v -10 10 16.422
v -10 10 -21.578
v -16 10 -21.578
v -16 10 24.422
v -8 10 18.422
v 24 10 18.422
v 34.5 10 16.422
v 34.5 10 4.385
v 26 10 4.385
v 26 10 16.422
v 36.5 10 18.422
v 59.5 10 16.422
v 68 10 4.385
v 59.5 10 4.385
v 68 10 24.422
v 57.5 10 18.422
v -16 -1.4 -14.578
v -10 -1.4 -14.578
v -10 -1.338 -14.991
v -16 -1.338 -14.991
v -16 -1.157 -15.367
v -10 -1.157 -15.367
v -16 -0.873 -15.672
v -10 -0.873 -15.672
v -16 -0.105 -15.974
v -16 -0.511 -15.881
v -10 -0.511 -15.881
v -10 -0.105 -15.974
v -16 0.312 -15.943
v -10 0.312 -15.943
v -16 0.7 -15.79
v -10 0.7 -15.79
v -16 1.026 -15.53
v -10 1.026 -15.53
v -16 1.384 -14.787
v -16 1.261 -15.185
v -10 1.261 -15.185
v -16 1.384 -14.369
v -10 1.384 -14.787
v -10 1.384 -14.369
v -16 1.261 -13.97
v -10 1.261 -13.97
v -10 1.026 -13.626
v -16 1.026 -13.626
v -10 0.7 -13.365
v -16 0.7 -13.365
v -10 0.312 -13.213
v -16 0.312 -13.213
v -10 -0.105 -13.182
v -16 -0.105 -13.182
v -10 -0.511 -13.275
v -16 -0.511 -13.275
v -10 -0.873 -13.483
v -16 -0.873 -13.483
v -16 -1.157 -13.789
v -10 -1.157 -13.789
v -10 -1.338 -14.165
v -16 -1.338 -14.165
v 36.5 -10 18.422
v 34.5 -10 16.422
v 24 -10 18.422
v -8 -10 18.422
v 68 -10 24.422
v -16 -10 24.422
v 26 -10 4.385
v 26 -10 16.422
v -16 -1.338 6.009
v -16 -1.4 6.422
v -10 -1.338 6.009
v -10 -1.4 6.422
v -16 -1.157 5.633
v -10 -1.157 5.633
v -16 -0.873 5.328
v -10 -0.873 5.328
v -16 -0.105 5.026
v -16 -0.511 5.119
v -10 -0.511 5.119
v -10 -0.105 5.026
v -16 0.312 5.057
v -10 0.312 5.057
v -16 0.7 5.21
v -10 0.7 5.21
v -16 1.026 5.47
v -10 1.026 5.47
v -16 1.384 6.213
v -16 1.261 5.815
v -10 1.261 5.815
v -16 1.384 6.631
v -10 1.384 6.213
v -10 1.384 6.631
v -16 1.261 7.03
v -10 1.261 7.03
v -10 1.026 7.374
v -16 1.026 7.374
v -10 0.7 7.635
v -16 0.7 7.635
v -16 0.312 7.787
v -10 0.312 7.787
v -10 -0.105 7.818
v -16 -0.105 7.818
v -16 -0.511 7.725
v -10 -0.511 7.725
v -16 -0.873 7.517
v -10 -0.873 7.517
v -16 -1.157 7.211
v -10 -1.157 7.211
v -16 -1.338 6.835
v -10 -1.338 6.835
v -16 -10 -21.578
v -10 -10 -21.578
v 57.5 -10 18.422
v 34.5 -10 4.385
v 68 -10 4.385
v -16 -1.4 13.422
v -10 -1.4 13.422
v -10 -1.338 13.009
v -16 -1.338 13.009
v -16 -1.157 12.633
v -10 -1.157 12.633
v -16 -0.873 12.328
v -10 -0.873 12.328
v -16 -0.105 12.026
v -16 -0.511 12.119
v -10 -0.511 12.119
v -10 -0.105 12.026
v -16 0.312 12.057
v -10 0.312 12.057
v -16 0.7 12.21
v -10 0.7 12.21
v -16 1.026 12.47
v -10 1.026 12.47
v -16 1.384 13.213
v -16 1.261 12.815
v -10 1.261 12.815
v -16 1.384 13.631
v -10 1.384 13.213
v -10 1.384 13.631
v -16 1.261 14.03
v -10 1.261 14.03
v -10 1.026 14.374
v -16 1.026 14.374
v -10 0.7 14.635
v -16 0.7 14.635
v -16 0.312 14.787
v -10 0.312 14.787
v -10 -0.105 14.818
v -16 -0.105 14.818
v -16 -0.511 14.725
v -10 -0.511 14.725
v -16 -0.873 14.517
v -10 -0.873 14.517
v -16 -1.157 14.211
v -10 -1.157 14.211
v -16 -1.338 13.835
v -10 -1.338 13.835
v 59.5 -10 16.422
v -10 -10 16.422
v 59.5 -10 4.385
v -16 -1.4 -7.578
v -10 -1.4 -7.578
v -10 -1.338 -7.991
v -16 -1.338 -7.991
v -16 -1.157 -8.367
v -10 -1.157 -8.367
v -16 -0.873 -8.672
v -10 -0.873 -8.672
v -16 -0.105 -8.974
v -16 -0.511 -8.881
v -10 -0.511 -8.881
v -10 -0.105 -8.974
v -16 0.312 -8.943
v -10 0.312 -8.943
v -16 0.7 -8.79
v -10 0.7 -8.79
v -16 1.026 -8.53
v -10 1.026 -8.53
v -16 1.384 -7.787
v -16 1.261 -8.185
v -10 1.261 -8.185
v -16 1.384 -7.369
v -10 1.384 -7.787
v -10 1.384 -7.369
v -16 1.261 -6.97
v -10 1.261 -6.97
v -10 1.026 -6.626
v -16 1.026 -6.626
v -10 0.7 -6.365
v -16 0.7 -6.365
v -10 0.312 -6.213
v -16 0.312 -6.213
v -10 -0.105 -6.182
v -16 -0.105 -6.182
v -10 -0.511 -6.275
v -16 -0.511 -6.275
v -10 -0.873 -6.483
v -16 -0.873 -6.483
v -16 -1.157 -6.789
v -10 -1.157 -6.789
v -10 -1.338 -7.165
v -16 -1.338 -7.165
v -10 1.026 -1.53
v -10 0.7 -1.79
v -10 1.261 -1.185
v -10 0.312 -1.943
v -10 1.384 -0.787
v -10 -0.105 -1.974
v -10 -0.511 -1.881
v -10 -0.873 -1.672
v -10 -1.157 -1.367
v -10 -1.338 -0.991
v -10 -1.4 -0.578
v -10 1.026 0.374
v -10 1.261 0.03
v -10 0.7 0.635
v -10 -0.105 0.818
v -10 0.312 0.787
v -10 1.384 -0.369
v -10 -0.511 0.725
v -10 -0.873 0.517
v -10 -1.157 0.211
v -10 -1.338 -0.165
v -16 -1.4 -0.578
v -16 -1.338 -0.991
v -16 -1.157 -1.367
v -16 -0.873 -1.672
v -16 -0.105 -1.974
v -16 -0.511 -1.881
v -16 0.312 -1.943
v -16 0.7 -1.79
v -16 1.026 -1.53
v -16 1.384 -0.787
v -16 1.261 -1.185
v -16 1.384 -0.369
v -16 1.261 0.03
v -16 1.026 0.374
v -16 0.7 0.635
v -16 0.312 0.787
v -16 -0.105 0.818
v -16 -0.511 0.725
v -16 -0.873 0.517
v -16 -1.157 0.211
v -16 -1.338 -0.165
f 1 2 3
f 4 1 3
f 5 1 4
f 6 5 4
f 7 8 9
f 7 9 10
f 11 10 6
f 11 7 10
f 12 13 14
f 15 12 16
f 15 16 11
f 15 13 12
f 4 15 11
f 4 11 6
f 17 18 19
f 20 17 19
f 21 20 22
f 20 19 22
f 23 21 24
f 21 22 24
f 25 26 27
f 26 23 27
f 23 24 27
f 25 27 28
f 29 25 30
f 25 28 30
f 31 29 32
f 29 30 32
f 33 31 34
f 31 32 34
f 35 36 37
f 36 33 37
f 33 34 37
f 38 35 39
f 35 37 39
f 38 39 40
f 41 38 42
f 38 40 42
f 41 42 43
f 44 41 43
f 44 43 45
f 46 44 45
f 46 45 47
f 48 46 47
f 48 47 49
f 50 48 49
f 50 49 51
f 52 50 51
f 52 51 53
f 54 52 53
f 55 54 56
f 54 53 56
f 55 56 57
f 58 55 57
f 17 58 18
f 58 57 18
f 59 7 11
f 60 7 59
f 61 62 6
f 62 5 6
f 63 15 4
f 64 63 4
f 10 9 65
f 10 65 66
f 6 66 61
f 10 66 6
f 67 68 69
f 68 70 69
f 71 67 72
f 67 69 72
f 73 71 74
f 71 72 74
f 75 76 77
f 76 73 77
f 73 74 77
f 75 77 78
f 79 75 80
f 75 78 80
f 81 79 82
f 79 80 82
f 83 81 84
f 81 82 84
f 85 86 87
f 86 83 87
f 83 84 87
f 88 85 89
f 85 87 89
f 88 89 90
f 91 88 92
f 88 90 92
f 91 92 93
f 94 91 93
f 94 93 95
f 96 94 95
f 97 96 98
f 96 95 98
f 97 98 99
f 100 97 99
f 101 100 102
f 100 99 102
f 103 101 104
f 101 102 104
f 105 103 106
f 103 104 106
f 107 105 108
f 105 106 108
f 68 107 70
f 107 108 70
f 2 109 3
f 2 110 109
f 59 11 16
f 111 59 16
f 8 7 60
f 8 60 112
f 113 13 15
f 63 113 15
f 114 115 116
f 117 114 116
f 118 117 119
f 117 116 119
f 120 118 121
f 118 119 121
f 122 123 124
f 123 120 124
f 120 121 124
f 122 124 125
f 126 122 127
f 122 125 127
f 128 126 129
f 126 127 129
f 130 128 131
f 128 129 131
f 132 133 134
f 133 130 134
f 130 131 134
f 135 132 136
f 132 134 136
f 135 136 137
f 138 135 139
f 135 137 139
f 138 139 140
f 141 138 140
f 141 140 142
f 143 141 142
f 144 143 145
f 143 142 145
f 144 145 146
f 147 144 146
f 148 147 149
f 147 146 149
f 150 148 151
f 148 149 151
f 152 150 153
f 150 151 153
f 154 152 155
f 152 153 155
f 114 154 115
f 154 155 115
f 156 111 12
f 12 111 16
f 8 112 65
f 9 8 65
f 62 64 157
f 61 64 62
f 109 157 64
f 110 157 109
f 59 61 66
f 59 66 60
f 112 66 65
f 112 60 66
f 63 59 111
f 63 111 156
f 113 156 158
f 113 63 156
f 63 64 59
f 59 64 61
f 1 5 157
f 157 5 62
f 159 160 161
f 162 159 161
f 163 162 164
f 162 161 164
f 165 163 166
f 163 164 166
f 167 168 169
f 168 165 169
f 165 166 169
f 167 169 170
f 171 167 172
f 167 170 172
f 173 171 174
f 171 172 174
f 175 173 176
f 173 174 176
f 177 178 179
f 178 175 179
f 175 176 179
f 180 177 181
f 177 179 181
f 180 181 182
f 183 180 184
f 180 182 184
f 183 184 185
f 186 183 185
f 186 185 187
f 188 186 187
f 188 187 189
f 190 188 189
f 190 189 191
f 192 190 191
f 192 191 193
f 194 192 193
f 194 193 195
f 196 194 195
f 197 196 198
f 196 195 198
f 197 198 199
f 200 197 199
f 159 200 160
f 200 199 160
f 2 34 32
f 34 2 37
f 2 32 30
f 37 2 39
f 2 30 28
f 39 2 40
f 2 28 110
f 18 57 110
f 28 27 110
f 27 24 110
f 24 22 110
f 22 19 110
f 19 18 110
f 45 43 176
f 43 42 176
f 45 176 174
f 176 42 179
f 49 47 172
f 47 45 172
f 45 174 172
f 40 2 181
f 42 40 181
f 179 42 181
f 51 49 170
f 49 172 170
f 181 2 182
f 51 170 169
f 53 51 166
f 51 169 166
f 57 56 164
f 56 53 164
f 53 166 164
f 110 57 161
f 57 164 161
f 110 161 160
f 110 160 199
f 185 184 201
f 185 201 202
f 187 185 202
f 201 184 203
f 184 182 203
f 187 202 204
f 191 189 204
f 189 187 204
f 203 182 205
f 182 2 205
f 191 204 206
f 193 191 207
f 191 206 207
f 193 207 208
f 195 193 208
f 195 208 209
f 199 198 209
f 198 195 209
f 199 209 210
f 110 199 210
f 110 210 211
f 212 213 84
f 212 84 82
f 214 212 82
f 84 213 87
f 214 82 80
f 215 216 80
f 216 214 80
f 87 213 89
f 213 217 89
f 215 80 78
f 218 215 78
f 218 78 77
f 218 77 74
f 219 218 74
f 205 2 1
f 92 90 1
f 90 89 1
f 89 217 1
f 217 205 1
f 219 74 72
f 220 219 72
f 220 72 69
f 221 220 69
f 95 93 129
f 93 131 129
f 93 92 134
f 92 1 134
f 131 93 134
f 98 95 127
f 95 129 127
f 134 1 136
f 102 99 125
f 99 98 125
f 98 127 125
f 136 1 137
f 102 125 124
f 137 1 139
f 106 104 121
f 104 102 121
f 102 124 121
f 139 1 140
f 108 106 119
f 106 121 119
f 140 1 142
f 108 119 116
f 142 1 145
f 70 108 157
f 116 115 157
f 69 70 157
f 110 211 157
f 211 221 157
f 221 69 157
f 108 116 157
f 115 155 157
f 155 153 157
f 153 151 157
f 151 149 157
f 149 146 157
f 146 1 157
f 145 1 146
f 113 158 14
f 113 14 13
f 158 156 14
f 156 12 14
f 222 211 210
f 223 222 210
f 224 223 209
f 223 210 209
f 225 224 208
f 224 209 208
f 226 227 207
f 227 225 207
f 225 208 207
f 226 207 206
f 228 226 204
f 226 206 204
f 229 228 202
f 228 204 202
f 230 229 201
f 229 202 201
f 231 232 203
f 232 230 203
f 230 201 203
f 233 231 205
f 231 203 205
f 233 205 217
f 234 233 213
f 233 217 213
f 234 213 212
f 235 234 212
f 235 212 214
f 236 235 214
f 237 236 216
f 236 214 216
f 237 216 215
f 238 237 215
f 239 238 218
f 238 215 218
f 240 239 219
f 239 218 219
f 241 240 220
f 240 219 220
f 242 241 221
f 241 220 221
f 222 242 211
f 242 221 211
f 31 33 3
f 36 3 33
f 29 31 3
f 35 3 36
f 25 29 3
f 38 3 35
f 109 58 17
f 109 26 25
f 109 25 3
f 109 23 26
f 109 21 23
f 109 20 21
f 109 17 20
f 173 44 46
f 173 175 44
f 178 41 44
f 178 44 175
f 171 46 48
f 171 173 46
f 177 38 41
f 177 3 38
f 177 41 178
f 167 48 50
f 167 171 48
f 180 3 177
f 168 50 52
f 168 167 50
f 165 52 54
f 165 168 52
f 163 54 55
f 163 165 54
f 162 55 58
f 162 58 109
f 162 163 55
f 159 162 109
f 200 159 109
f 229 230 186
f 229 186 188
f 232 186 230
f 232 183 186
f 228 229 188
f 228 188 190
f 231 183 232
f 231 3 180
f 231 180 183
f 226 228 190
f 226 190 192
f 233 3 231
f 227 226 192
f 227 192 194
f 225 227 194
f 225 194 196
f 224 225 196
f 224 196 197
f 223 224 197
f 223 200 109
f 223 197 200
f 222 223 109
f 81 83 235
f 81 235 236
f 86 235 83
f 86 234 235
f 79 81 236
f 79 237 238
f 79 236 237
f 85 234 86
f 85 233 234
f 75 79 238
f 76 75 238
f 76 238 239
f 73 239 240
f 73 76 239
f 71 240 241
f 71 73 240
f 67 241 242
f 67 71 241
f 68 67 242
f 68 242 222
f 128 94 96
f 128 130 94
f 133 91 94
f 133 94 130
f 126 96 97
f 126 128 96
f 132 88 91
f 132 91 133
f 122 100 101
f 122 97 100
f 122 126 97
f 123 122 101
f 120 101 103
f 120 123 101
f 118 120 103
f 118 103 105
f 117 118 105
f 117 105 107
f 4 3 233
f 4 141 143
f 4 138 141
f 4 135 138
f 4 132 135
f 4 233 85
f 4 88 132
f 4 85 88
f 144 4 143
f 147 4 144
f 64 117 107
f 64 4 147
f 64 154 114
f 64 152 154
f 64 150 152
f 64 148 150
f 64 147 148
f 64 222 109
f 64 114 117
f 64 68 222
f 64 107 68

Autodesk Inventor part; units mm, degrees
ref_plane "YZ Plane" through (0, 0, 0) normal (1, 0, 0) x (0, 1, 0)
ref_plane "XZ Plane" through (0, 0, 0) normal (0, 1, 0) x (-1, 0, 0)
ref_plane "XY Plane" through (0, 0, 0) normal (0, 0, 1) x (1, 0, 0)
ref_plane "Work Plane1" through (-10, 22.6373, -244.9923) normal (-1, 0, 0) x (0, -1, 0)
sketch "Sketch1" plane through (-10, 22.6373, -244.9923) normal (-1, 0, 0) x (0, -1, 0)
  line L0 (26.6373, -5.0077) -> (32.6373, -5.0077) construction
  line L1 (32.6373, -5.0077) -> (32.6373, 244.9923) construction
  line L2 (26.6373, 244.9923) -> (32.6373, 244.9923) construction
  line L3 (26.6373, -5.0077) -> (26.6373, 244.9923) construction
  line L4 (12.6373, -5.0077) -> (18.6373, -5.0077) construction
  line L5 (18.6373, -5.0077) -> (18.6373, 244.9923) construction
  line L6 (12.6373, 244.9923) -> (18.6373, 244.9923) construction
  line L7 (12.6373, -5.0077) -> (12.6373, 244.9923) construction
  line L8 (12.6373, 223.4144) -> (32.6373, 223.4144) construction
  line L9 (32.6373, 223.4144) -> (32.6373, 263.4144) construction
  line L10 (32.6373, 263.4144) -> (12.6373, 263.4144) construction
  line L11 (12.6373, 263.4144) -> (12.6373, 223.4144) construction
  line L12 (12.6373, 263.4144) -> (32.6373, 263.4144) construction
  line L13 (32.6373, 263.4144) -> (32.6373, 223.4144) construction
  line L14 (32.6373, 223.4144) -> (12.6373, 223.4144) construction
  line L15 (12.6373, 223.4144) -> (12.6373, 263.4144) construction
  line L16 (12.6373, 263.4144) -> (32.6373, 263.4144)
  line L17 (32.6373, 263.4144) -> (32.6373, 223.4144)
  line L18 (32.6373, 223.4144) -> (12.6373, 223.4144)
  line L19 (12.6373, 223.4144) -> (12.6373, 263.4144)
  circle A0 centre (22.6373, 258.4144) radius 1.4
  circle A1 centre (22.6373, 251.4144) radius 1.4
  circle A2 centre (22.6373, 244.4144) radius 1.4
  circle A3 centre (22.6373, 237.4144) radius 1.4
  circle A4 centre (22.6373, 230.4144) radius 1.4
  circle A5 centre (22.6373, 223.4144) radius 1.4
  point P0 (22.6373, 244.9923)
  dimension "d0" = 40
  dimension "d1" = 20
  dimension "d2" = 2.8
  dimension "d3" = 5
  dimension "d4" = 10
  dimension "d7" = 7
extrude "Extrusion1" add sketch "Sketch1" along normal blind 6 contours L16 L17 L18 A5 L19 | A5 L18 picked at (22.1842, 223.5261)
sketch "Sketch2" plane through (-10, 10, 18.4222) normal (0, 1, 0) x (1, 0, 0)
  line L0 (0, 0) -> (0, 40) projected
  line L1 (0, 40) -> (-6, 40) projected
  line L2 (-6, 0) -> (-6, 40) projected
  line L3 (0, 0) -> (-6, 0) projected
  line L4 (-6, 40) -> (-6, 0) projected
  line L5 (-6, 0) -> (78, 0)
  line L6 (78, 0) -> (78, -6)
  line L7 (78, -6) -> (-6, -6)
  line L8 (-6, -6) -> (-6, 0)
  line L9 (36, 0) -> (44.5, 0)
  line L10 (44.5, 0) -> (44.5, 14.0376)
  line L11 (44.5, 14.0376) -> (36, 14.0376)
  line L12 (36, 14.0376) -> (36, 0)
  line L13 (78, 0) -> (69.5, 0)
  line L14 (69.5, 0) -> (69.5, 14.0376)
  line L15 (69.5, 14.0376) -> (78, 14.0376)
  line L16 (78, 14.0376) -> (78, 0)
  point P0 (10, 18.4222)
  dimension "d14" = 84
  dimension "d15" = 6
  dimension "d16" = 8.5
  dimension "d17" = 36
  dimension "d18" = 8.5
extrude "Extrusion2" add sketch "Sketch2" against normal up to surface (20 mm away) contours L5 L6 L7 L8 L3 | L12 L11 L10 L5 | L14 L15 L16 L5
chamfer "Chamfer1" distance 2 angle 45 4 edges at (-10, 0, 18.4222) (26, 0, 18.4222) (59.5, 0, 18.4222) (34.5, 0, 18.4222)
sketch "Sketch3" plane through (34.5, 10, 4.3845) normal (0, 0, -1) x (-1, 0, 0)
  circle A0 centre (7.15, -8.3308) radius 5.85 projected
  circle A1 centre (-27.35, -10) radius 5.85 projected
  circle A2 centre (-27.35, -10) radius 2.45
  circle A3 centre (7.15, -8.3308) radius 4.1 projected
  point P0 (34.5, -10)
  dimension "d26" = 4.9
extrude "Extrusion3" [suppressed]
properties part number "Neje_Endrole_Adapter"
